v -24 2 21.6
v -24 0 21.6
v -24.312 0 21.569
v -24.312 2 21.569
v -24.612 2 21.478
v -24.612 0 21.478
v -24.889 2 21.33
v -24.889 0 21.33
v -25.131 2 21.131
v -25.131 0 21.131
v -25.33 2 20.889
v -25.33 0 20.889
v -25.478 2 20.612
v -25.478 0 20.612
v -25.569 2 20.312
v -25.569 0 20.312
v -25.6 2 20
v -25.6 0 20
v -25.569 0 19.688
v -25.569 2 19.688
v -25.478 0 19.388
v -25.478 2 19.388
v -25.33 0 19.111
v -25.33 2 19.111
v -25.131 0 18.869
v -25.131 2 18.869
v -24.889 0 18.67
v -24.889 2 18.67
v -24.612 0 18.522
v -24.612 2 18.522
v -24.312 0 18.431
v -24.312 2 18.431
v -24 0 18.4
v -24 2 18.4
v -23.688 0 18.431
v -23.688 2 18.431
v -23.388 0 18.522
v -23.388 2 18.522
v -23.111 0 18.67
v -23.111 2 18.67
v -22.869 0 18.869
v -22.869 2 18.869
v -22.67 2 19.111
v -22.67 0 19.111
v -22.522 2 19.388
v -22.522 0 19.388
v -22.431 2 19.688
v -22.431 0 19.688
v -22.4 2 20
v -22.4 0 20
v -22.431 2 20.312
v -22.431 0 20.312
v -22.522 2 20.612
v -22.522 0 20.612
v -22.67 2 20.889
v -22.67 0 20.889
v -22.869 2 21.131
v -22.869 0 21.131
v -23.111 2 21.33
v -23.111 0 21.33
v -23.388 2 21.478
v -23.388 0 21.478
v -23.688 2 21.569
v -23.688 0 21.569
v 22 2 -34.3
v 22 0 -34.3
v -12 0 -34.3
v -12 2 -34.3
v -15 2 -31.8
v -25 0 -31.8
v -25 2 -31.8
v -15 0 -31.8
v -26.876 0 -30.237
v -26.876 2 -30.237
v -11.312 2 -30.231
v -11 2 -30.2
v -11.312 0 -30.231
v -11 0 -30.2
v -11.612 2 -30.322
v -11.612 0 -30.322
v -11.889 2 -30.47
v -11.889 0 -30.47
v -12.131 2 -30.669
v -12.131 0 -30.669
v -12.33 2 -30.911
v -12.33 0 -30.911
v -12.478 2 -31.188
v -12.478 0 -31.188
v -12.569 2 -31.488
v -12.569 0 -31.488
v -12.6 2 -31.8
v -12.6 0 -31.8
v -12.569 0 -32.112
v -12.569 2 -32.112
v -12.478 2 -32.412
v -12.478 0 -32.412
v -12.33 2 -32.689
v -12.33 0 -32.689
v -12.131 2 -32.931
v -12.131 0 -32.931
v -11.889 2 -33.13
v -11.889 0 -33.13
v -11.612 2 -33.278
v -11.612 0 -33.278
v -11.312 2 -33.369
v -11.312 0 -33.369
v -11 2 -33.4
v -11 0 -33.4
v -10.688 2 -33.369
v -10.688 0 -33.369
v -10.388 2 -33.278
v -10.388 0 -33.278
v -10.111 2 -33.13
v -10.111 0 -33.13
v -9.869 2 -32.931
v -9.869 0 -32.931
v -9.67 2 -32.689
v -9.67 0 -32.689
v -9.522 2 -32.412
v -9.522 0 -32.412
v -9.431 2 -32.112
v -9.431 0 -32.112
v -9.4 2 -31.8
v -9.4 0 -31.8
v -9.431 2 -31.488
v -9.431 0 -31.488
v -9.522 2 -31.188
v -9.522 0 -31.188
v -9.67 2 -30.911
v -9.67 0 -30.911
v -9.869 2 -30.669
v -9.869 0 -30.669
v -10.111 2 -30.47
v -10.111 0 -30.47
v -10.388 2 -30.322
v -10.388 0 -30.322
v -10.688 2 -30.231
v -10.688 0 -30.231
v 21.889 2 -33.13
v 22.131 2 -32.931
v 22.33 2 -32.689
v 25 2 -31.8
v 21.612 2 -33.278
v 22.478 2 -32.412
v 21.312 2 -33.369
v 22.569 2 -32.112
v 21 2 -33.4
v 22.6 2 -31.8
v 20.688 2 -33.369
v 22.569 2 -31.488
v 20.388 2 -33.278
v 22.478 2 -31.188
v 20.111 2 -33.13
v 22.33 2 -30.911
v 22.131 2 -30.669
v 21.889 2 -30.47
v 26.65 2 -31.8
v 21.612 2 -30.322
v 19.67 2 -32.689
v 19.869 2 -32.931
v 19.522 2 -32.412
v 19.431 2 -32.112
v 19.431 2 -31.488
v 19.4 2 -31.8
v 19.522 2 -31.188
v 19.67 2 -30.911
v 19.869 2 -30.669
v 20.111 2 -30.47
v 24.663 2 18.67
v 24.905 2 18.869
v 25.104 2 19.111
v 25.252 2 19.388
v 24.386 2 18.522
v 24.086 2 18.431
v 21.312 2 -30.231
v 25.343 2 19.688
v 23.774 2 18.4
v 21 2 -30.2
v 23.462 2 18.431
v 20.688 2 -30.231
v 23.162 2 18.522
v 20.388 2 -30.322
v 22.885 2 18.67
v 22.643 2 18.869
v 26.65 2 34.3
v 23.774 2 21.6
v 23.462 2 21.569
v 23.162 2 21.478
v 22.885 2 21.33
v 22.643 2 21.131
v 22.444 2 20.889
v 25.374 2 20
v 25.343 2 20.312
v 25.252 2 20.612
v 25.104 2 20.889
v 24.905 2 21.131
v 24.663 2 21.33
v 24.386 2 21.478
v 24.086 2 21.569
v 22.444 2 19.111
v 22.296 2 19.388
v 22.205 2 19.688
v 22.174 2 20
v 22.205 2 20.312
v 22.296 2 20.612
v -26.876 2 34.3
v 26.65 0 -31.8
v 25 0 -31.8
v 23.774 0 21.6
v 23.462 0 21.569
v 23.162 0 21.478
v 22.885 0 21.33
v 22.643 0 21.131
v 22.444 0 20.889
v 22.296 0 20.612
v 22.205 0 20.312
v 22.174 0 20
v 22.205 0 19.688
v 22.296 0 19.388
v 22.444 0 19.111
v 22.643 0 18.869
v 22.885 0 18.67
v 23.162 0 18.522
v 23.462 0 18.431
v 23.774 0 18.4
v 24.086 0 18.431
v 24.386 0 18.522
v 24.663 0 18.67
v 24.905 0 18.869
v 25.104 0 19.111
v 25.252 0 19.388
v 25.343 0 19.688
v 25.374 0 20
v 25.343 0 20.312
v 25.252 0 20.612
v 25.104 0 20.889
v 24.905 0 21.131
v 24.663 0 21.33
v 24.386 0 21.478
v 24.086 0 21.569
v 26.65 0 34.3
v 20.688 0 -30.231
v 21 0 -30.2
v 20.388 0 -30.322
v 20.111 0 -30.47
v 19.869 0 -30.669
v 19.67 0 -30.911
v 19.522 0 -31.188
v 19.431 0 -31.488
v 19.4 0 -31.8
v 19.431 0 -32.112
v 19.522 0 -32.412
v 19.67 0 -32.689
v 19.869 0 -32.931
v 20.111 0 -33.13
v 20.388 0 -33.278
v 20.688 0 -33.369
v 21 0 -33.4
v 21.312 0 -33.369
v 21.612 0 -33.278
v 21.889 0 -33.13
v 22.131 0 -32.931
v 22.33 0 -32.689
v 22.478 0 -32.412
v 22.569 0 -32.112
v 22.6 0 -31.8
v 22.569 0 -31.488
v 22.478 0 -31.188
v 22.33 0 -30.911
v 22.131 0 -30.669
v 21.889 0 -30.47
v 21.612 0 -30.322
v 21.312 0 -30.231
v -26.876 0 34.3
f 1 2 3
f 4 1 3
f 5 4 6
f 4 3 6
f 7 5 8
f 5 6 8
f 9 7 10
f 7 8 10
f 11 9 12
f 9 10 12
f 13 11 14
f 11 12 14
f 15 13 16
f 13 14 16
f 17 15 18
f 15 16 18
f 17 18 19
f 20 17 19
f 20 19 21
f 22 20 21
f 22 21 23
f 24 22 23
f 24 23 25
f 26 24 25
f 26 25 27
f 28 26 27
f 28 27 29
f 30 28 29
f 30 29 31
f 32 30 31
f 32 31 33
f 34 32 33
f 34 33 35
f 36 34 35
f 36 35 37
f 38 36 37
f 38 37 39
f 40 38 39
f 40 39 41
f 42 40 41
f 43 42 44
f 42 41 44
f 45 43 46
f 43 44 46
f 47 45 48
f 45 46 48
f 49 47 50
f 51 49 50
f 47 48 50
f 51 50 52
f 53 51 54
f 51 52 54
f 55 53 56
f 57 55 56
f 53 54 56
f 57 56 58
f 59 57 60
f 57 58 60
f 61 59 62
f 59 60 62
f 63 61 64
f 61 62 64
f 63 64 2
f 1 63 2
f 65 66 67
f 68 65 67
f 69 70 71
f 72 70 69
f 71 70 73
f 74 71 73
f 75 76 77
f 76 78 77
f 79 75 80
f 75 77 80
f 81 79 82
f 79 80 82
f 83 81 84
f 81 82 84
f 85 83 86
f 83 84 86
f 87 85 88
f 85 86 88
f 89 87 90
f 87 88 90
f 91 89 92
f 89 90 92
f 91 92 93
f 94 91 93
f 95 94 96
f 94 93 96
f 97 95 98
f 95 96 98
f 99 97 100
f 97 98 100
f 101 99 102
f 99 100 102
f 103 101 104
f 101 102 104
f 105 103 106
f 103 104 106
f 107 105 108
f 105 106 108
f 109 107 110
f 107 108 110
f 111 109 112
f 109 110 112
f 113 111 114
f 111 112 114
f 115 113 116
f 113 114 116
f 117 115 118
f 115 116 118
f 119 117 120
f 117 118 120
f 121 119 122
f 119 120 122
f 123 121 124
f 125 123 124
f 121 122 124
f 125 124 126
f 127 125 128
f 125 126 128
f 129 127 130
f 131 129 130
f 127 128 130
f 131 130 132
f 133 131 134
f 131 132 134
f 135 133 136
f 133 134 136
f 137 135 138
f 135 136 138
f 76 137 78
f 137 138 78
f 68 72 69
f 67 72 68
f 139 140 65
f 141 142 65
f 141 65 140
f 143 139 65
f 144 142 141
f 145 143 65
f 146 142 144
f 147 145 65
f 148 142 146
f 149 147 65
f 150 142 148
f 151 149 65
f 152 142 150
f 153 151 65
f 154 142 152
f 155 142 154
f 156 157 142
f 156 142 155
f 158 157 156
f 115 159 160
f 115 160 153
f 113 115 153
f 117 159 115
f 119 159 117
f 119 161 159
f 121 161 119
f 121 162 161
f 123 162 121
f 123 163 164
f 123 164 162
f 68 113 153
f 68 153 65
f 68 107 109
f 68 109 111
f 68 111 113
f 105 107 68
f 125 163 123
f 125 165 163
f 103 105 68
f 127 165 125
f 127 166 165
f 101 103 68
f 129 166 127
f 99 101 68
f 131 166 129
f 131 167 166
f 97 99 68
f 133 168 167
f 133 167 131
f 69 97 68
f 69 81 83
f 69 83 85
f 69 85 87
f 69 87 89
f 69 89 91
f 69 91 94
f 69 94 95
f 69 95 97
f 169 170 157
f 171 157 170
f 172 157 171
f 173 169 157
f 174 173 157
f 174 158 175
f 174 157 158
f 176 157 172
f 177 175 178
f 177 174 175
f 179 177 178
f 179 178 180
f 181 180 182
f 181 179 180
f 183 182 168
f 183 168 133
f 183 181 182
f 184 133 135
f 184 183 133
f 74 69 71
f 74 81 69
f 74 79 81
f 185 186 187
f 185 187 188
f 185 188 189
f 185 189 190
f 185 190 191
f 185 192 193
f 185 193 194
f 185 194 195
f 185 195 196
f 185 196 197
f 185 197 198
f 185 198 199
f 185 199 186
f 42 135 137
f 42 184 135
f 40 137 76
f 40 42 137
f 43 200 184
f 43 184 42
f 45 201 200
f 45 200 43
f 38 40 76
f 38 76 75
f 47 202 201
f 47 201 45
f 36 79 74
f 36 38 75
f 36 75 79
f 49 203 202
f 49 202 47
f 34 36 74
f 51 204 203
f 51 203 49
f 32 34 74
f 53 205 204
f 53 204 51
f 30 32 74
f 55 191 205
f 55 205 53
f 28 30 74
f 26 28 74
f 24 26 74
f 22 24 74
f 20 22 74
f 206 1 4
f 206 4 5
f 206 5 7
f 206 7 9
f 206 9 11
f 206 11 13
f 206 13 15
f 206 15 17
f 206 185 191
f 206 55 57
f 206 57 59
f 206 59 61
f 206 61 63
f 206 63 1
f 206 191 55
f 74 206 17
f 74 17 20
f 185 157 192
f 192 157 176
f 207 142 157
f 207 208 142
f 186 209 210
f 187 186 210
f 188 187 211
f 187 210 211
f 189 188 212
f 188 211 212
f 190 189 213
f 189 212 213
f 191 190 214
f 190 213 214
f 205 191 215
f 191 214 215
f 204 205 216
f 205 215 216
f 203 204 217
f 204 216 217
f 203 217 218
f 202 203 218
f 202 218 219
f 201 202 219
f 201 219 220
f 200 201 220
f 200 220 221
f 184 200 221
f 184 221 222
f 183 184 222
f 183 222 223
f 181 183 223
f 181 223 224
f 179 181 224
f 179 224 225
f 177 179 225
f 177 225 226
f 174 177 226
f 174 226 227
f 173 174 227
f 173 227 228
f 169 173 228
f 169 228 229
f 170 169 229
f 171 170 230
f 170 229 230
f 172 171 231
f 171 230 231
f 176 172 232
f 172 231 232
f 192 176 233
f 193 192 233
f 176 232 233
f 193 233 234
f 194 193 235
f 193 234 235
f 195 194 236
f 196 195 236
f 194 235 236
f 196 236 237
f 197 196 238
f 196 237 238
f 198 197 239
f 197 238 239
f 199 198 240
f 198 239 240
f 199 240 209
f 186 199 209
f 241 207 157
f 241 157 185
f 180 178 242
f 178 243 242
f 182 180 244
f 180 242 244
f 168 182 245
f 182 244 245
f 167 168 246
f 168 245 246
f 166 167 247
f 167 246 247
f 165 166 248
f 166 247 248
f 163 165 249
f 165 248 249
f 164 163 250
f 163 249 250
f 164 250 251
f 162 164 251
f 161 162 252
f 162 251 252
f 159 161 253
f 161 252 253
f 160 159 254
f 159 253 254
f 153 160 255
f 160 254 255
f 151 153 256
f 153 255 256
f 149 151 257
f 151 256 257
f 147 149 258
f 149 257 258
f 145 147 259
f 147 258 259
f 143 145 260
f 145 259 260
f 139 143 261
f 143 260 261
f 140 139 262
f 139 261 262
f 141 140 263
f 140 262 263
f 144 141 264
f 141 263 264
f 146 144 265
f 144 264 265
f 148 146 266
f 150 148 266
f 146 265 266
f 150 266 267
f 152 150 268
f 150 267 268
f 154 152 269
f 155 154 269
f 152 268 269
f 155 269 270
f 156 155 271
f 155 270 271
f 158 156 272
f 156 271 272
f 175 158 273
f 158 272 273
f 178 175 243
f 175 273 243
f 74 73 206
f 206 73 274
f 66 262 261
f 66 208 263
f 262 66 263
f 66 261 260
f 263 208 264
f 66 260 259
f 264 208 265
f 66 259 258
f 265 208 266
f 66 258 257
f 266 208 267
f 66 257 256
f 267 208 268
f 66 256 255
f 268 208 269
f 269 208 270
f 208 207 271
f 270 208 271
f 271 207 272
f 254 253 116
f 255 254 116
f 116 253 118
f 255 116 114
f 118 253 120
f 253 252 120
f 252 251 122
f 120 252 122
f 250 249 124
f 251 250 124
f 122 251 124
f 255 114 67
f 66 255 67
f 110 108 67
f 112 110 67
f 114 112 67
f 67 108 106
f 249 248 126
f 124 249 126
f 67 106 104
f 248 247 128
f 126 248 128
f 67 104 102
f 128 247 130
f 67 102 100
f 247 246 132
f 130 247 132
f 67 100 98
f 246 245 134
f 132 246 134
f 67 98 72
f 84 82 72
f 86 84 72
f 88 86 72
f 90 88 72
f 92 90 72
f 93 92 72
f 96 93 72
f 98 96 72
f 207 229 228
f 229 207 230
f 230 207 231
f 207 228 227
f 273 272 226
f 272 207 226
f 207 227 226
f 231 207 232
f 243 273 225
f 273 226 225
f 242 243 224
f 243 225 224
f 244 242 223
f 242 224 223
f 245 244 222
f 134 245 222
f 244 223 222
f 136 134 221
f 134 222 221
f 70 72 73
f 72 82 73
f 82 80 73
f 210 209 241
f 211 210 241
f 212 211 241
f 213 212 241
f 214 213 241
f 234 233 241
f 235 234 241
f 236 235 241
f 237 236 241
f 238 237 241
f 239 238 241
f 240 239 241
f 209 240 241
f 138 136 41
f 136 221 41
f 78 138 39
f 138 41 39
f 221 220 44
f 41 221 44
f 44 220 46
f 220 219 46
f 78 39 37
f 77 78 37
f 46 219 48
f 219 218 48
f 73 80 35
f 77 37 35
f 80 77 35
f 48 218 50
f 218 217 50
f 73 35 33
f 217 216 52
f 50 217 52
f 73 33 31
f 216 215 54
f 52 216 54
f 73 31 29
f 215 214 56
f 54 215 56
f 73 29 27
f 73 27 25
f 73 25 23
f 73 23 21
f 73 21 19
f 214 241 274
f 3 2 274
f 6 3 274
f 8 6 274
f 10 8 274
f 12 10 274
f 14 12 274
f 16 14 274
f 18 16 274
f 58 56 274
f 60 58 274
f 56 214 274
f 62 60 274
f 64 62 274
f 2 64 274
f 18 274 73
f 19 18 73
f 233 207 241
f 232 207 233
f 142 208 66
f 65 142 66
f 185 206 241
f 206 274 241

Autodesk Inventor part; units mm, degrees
ref_plane "YZ Plane" through (0, 0, 0) normal (1, 0, 0) x (0, 1, 0)
ref_plane "XZ Plane" through (0, 0, 0) normal (0, 1, 0) x (-1, 0, 0)
ref_plane "XY Plane" through (0, 0, 0) normal (0, 0, 1) x (1, 0, 0)
sketch "Sketch1" plane through (0, 0, 0) normal (0, 1, 0) x (-1, 0, 0)
  line L0 (26.8759, 34.3) -> (-26.65, 34.3)
  line L1 (-25, -31.8) -> (-22, -34.3)
  line L2 (15, -31.8) -> (12, -34.3)
  line L3 (-25, -31.8) -> (-26.65, -31.8)
  line L4 (-22, -34.3) -> (12, -34.3)
  line L5 (-26.65, -31.8) -> (-26.65, 34.3)
  line L6 (25, -31.8) -> (26.8759, -30.2368)
  line L7 (25, -31.8) -> (15, -31.8)
  line L8 (26.8759, -30.2368) -> (26.8759, 34.3)
  line L9 (26.8759, 34.3) -> (-26.65, 34.3)
  line L10 (-26.65, -31.8) -> (-26.65, 34.3)
  line L11 (-26.65, -31.8) -> (-25, -31.8)
  line L12 (-25, -31.8) -> (-22, -34.3)
  line L13 (-22, -34.3) -> (12, -34.3)
  line L14 (12, -34.3) -> (15, -31.8)
  line L15 (15, -31.8) -> (25, -31.8)
  line L16 (25, -31.8) -> (26.8759, -30.2368)
  line L17 (26.8759, -30.2368) -> (26.8759, 34.3)
  point P0 (0, 0)
  point P1 (0, 0)
extrude "Extrusion1" add sketch "Sketch1" along normal blind 2
sketch "Sketch2" plane through (0, 2, 0) normal (0, 1, 0) x (1, 0, 0)
  line L0 (-26.8759, -34.3) -> (26.65, -34.3) construction
  line L1 (-24, -34.3) -> (-24, -20) construction
  circle A0 centre (-24, -20) radius 1.6
  line L2 (-0.1129, -34.3) -> (-0.1129, 34.3) construction
  line L3 (22, 34.3) -> (-12, 34.3) construction
  circle A1 centre (-24, -20) radius 1.6 construction
  circle A2 centre (23.7741, -20) radius 1.6
  point P0 (0, 0)
  dimension "d5" = 3.2
sketch "Sketch3" plane through (0, 2, 0) normal (0, 1, 0) x (1, 0, 0)
  circle A0 centre (-11, 31.8) radius 1.6 construction
  circle A1 centre (-11, 31.8) radius 1.6
  circle A2 centre (21, 31.8) radius 1.6
  line L0 (-18, -34.3) -> (-18, -38) construction
  line L1 (-18, -38) -> (-8, -38) construction
  line L2 (-8, -38) -> (-8, -34.3) construction
  line L3 (24, -36) -> (16, -36) construction
  line L4 (16, -36) -> (16, -34.3) construction
  line L5 (24, -34.3) -> (24, -36)
  line L6 (16, -36) -> (16, -34.3)
  line L7 (-8, -34.3) -> (-8, -38)
  line L8 (-18, -38) -> (-18, -34.3)
  line L9 (-18, -38) -> (-8, -38)
  line L10 (16, -36) -> (24, -36)
  line L11 (-18, -34.3) -> (-8, -34.3)
  line L12 (-26.8759, -34.3) -> (26.65, -34.3) projected
  line L13 (16, -34.3) -> (24, -34.3)
  line L14 (-26.8759, -34.3) -> (26.65, -34.3)
  line L15 (26.65, -34.3) -> (24, -34.3)
  line L16 (24, -34.3) -> (24, -36)
  line L17 (24, -36) -> (16, -36)
  line L18 (16, -34.3) -> (-8, -34.3)
  line L19 (-8, -34.3) -> (-8, -38)
  line L20 (-18, -38) -> (-18, -34.3)
  line L21 (-26.8759, 30.2368) -> (-25, 31.8)
  line L22 (-25, 31.8) -> (-26.8759, 30.2368) projected
  line L23 (-15, 31.8) -> (-12, 34.3)
  line L24 (-12, 34.3) -> (-15, 31.8) projected
  line L25 (-12, 34.3) -> (22, 34.3)
  line L26 (22, 34.3) -> (-12, 34.3) projected
  line L27 (22, 34.3) -> (25, 31.8)
  line L28 (25, 31.8) -> (22, 34.3) projected
  line L29 (25, 31.8) -> (26.65, 31.8)
  line L30 (26.65, 31.8) -> (26.65, -34.3)
  line L31 (-26.8759, -34.3) -> (26.65, -34.3) projected
  line L32 (-11, 31.8) -> (21, 31.8) construction
  line L33 (5, 31.8) -> (5, 0) construction
  point P0 (0, 0)
hole "Hole1" at (-24, 2, 20) at (23.7741, 2, 20) direction (0, -1, 0) diameter 3.2 depth 8 tip angle 118
hole "Hole2" at (-11, 2, -31.8) at (21, 2, -31.8) direction (0, -1, 0) diameter 3.2 depth 8 tip angle 118
properties part number "Arduino"
